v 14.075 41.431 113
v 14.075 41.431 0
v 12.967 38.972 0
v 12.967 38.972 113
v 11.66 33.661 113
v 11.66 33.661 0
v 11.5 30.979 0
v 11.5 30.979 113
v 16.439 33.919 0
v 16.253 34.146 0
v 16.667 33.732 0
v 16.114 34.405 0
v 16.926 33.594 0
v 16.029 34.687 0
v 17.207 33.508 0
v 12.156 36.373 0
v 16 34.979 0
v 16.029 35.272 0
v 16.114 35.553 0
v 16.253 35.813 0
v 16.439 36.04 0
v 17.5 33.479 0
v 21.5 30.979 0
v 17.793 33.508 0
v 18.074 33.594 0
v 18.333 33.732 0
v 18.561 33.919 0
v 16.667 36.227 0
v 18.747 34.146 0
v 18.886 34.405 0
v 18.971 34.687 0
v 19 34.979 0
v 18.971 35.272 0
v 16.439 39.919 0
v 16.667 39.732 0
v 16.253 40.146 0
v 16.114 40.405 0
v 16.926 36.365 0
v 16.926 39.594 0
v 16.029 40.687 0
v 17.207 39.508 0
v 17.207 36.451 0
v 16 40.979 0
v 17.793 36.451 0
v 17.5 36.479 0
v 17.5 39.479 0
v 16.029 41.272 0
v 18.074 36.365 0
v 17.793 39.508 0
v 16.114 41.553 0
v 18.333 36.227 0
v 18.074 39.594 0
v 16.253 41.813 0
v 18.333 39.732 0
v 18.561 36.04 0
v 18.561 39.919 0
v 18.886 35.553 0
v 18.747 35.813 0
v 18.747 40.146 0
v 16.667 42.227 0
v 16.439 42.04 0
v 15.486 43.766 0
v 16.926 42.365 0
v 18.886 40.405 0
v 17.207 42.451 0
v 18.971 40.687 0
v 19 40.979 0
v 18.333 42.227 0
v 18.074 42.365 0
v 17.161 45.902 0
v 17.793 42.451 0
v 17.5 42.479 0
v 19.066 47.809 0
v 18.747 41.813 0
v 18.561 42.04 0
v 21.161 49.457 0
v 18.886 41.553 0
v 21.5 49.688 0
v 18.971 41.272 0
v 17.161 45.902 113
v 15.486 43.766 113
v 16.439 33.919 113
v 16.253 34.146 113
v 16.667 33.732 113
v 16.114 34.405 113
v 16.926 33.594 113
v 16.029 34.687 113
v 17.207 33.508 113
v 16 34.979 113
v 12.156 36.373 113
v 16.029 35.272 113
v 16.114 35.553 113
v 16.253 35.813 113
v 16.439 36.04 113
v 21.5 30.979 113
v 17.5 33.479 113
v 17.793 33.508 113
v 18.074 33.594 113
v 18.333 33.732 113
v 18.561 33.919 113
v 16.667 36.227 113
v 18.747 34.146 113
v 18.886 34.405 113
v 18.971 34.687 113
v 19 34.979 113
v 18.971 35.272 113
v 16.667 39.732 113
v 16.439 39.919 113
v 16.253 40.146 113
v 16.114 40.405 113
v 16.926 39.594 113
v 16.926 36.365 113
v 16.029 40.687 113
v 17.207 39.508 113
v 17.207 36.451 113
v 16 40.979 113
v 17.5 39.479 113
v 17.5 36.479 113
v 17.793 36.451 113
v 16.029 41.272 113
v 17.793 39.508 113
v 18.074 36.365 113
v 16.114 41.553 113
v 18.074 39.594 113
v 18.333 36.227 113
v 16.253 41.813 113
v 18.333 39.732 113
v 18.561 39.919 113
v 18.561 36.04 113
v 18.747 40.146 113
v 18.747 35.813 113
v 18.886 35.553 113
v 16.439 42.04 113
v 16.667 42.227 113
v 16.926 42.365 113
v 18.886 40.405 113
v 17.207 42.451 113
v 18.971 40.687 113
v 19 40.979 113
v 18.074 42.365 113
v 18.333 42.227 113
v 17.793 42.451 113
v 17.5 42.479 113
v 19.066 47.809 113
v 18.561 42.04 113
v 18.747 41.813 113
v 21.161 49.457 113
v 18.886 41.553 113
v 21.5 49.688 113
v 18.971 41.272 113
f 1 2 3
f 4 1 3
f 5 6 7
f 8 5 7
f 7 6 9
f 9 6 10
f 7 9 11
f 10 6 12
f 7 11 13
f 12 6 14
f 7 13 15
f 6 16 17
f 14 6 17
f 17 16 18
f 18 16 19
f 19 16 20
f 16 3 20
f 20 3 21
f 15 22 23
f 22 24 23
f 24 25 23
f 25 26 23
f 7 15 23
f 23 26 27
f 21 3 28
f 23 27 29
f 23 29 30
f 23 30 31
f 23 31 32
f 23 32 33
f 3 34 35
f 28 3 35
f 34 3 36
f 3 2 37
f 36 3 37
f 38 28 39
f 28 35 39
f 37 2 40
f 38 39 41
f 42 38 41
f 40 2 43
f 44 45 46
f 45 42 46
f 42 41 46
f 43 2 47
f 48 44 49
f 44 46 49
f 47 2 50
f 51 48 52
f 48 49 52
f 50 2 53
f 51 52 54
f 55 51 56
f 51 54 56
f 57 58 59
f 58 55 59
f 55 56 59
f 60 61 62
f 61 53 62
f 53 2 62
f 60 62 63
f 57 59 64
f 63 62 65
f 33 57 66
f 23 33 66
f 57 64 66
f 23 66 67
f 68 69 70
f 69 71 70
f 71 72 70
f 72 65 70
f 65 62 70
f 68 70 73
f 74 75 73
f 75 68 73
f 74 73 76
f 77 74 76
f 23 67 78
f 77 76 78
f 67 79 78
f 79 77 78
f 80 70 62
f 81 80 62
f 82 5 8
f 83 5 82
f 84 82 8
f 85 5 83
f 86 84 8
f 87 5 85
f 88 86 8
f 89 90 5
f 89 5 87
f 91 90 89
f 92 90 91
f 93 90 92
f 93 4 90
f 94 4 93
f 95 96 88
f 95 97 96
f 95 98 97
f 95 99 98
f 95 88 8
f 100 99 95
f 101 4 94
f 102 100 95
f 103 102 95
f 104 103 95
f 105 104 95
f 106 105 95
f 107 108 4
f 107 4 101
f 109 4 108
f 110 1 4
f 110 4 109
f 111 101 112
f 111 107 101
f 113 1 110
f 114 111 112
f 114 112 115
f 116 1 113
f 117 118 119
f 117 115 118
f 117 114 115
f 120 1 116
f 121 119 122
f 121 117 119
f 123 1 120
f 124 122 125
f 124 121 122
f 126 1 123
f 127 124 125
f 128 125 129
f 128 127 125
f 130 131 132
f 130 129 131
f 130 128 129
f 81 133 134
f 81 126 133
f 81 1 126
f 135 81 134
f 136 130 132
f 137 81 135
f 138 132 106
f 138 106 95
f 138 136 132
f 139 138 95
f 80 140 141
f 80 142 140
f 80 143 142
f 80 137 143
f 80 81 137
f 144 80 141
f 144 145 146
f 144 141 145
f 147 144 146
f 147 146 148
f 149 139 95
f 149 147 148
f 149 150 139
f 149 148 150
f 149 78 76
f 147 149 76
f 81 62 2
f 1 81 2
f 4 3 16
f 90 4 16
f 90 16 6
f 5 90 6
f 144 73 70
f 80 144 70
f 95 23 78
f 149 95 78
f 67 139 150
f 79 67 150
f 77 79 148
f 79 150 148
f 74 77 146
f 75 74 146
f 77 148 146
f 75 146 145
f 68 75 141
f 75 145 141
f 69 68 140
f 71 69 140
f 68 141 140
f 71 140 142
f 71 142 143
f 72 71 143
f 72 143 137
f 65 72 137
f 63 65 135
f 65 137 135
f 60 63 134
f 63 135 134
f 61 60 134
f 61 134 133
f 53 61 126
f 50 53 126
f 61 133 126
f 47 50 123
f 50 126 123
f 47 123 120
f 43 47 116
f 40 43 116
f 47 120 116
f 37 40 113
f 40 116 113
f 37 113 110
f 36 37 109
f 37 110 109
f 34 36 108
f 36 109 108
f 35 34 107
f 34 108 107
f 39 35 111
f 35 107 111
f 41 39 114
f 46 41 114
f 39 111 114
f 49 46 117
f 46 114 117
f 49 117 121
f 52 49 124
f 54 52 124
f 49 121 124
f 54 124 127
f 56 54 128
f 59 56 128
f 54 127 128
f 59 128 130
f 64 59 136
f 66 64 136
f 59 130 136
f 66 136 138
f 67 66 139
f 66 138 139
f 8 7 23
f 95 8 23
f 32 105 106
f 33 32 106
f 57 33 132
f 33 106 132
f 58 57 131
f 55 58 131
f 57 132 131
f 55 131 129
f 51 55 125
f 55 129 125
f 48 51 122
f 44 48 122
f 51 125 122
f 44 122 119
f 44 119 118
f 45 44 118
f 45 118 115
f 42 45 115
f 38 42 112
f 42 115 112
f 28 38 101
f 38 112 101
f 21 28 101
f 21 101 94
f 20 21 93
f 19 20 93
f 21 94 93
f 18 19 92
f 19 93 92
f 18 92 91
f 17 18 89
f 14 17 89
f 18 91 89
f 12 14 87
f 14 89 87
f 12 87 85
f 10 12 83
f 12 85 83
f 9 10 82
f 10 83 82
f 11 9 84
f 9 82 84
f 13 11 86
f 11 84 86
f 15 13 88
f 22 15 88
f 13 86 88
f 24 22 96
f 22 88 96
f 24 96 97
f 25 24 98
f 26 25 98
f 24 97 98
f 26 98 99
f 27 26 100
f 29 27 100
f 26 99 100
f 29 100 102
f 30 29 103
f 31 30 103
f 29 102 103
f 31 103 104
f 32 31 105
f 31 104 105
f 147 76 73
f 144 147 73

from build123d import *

# Parameters (mm, degrees)
RESSALTO_EXTRUS_O1_DEPTH = 113
ESBO_O2_R                = 1.5
CORTE_EXTRUS_O1_DEPTH    = 113


with BuildPart() as part:
    # Esboço1 → Ressalto-extrusão1 (new body)
    with BuildSketch(Plane.XY):
        Polygon((11.5, 30.979337094), (21.5, 30.979337094), (21.5, 49.687624028), (21.161059666, 49.456664041), (19.066345307, 47.808952584), (17.161004874, 45.902414631), (15.486453, 43.765993321), (14.074906639, 41.431162512), (12.967287062, 38.97151993), (12.155978451, 36.372733292), (11.660337074, 33.660653998), align=None)
    extrude(amount=RESSALTO_EXTRUS_O1_DEPTH)

    # Esboço2 → Corte-extrusão1 (cut)
    with BuildSketch(Plane.XY.offset(113)):
        with Locations((17.5, 34.979337094)):
            Circle(ESBO_O2_R)
        with Locations((17.5, 40.979337094)):
            Circle(ESBO_O2_R)
    extrude(amount=-CORTE_EXTRUS_O1_DEPTH, mode=Mode.SUBTRACT)


solid = part.part
